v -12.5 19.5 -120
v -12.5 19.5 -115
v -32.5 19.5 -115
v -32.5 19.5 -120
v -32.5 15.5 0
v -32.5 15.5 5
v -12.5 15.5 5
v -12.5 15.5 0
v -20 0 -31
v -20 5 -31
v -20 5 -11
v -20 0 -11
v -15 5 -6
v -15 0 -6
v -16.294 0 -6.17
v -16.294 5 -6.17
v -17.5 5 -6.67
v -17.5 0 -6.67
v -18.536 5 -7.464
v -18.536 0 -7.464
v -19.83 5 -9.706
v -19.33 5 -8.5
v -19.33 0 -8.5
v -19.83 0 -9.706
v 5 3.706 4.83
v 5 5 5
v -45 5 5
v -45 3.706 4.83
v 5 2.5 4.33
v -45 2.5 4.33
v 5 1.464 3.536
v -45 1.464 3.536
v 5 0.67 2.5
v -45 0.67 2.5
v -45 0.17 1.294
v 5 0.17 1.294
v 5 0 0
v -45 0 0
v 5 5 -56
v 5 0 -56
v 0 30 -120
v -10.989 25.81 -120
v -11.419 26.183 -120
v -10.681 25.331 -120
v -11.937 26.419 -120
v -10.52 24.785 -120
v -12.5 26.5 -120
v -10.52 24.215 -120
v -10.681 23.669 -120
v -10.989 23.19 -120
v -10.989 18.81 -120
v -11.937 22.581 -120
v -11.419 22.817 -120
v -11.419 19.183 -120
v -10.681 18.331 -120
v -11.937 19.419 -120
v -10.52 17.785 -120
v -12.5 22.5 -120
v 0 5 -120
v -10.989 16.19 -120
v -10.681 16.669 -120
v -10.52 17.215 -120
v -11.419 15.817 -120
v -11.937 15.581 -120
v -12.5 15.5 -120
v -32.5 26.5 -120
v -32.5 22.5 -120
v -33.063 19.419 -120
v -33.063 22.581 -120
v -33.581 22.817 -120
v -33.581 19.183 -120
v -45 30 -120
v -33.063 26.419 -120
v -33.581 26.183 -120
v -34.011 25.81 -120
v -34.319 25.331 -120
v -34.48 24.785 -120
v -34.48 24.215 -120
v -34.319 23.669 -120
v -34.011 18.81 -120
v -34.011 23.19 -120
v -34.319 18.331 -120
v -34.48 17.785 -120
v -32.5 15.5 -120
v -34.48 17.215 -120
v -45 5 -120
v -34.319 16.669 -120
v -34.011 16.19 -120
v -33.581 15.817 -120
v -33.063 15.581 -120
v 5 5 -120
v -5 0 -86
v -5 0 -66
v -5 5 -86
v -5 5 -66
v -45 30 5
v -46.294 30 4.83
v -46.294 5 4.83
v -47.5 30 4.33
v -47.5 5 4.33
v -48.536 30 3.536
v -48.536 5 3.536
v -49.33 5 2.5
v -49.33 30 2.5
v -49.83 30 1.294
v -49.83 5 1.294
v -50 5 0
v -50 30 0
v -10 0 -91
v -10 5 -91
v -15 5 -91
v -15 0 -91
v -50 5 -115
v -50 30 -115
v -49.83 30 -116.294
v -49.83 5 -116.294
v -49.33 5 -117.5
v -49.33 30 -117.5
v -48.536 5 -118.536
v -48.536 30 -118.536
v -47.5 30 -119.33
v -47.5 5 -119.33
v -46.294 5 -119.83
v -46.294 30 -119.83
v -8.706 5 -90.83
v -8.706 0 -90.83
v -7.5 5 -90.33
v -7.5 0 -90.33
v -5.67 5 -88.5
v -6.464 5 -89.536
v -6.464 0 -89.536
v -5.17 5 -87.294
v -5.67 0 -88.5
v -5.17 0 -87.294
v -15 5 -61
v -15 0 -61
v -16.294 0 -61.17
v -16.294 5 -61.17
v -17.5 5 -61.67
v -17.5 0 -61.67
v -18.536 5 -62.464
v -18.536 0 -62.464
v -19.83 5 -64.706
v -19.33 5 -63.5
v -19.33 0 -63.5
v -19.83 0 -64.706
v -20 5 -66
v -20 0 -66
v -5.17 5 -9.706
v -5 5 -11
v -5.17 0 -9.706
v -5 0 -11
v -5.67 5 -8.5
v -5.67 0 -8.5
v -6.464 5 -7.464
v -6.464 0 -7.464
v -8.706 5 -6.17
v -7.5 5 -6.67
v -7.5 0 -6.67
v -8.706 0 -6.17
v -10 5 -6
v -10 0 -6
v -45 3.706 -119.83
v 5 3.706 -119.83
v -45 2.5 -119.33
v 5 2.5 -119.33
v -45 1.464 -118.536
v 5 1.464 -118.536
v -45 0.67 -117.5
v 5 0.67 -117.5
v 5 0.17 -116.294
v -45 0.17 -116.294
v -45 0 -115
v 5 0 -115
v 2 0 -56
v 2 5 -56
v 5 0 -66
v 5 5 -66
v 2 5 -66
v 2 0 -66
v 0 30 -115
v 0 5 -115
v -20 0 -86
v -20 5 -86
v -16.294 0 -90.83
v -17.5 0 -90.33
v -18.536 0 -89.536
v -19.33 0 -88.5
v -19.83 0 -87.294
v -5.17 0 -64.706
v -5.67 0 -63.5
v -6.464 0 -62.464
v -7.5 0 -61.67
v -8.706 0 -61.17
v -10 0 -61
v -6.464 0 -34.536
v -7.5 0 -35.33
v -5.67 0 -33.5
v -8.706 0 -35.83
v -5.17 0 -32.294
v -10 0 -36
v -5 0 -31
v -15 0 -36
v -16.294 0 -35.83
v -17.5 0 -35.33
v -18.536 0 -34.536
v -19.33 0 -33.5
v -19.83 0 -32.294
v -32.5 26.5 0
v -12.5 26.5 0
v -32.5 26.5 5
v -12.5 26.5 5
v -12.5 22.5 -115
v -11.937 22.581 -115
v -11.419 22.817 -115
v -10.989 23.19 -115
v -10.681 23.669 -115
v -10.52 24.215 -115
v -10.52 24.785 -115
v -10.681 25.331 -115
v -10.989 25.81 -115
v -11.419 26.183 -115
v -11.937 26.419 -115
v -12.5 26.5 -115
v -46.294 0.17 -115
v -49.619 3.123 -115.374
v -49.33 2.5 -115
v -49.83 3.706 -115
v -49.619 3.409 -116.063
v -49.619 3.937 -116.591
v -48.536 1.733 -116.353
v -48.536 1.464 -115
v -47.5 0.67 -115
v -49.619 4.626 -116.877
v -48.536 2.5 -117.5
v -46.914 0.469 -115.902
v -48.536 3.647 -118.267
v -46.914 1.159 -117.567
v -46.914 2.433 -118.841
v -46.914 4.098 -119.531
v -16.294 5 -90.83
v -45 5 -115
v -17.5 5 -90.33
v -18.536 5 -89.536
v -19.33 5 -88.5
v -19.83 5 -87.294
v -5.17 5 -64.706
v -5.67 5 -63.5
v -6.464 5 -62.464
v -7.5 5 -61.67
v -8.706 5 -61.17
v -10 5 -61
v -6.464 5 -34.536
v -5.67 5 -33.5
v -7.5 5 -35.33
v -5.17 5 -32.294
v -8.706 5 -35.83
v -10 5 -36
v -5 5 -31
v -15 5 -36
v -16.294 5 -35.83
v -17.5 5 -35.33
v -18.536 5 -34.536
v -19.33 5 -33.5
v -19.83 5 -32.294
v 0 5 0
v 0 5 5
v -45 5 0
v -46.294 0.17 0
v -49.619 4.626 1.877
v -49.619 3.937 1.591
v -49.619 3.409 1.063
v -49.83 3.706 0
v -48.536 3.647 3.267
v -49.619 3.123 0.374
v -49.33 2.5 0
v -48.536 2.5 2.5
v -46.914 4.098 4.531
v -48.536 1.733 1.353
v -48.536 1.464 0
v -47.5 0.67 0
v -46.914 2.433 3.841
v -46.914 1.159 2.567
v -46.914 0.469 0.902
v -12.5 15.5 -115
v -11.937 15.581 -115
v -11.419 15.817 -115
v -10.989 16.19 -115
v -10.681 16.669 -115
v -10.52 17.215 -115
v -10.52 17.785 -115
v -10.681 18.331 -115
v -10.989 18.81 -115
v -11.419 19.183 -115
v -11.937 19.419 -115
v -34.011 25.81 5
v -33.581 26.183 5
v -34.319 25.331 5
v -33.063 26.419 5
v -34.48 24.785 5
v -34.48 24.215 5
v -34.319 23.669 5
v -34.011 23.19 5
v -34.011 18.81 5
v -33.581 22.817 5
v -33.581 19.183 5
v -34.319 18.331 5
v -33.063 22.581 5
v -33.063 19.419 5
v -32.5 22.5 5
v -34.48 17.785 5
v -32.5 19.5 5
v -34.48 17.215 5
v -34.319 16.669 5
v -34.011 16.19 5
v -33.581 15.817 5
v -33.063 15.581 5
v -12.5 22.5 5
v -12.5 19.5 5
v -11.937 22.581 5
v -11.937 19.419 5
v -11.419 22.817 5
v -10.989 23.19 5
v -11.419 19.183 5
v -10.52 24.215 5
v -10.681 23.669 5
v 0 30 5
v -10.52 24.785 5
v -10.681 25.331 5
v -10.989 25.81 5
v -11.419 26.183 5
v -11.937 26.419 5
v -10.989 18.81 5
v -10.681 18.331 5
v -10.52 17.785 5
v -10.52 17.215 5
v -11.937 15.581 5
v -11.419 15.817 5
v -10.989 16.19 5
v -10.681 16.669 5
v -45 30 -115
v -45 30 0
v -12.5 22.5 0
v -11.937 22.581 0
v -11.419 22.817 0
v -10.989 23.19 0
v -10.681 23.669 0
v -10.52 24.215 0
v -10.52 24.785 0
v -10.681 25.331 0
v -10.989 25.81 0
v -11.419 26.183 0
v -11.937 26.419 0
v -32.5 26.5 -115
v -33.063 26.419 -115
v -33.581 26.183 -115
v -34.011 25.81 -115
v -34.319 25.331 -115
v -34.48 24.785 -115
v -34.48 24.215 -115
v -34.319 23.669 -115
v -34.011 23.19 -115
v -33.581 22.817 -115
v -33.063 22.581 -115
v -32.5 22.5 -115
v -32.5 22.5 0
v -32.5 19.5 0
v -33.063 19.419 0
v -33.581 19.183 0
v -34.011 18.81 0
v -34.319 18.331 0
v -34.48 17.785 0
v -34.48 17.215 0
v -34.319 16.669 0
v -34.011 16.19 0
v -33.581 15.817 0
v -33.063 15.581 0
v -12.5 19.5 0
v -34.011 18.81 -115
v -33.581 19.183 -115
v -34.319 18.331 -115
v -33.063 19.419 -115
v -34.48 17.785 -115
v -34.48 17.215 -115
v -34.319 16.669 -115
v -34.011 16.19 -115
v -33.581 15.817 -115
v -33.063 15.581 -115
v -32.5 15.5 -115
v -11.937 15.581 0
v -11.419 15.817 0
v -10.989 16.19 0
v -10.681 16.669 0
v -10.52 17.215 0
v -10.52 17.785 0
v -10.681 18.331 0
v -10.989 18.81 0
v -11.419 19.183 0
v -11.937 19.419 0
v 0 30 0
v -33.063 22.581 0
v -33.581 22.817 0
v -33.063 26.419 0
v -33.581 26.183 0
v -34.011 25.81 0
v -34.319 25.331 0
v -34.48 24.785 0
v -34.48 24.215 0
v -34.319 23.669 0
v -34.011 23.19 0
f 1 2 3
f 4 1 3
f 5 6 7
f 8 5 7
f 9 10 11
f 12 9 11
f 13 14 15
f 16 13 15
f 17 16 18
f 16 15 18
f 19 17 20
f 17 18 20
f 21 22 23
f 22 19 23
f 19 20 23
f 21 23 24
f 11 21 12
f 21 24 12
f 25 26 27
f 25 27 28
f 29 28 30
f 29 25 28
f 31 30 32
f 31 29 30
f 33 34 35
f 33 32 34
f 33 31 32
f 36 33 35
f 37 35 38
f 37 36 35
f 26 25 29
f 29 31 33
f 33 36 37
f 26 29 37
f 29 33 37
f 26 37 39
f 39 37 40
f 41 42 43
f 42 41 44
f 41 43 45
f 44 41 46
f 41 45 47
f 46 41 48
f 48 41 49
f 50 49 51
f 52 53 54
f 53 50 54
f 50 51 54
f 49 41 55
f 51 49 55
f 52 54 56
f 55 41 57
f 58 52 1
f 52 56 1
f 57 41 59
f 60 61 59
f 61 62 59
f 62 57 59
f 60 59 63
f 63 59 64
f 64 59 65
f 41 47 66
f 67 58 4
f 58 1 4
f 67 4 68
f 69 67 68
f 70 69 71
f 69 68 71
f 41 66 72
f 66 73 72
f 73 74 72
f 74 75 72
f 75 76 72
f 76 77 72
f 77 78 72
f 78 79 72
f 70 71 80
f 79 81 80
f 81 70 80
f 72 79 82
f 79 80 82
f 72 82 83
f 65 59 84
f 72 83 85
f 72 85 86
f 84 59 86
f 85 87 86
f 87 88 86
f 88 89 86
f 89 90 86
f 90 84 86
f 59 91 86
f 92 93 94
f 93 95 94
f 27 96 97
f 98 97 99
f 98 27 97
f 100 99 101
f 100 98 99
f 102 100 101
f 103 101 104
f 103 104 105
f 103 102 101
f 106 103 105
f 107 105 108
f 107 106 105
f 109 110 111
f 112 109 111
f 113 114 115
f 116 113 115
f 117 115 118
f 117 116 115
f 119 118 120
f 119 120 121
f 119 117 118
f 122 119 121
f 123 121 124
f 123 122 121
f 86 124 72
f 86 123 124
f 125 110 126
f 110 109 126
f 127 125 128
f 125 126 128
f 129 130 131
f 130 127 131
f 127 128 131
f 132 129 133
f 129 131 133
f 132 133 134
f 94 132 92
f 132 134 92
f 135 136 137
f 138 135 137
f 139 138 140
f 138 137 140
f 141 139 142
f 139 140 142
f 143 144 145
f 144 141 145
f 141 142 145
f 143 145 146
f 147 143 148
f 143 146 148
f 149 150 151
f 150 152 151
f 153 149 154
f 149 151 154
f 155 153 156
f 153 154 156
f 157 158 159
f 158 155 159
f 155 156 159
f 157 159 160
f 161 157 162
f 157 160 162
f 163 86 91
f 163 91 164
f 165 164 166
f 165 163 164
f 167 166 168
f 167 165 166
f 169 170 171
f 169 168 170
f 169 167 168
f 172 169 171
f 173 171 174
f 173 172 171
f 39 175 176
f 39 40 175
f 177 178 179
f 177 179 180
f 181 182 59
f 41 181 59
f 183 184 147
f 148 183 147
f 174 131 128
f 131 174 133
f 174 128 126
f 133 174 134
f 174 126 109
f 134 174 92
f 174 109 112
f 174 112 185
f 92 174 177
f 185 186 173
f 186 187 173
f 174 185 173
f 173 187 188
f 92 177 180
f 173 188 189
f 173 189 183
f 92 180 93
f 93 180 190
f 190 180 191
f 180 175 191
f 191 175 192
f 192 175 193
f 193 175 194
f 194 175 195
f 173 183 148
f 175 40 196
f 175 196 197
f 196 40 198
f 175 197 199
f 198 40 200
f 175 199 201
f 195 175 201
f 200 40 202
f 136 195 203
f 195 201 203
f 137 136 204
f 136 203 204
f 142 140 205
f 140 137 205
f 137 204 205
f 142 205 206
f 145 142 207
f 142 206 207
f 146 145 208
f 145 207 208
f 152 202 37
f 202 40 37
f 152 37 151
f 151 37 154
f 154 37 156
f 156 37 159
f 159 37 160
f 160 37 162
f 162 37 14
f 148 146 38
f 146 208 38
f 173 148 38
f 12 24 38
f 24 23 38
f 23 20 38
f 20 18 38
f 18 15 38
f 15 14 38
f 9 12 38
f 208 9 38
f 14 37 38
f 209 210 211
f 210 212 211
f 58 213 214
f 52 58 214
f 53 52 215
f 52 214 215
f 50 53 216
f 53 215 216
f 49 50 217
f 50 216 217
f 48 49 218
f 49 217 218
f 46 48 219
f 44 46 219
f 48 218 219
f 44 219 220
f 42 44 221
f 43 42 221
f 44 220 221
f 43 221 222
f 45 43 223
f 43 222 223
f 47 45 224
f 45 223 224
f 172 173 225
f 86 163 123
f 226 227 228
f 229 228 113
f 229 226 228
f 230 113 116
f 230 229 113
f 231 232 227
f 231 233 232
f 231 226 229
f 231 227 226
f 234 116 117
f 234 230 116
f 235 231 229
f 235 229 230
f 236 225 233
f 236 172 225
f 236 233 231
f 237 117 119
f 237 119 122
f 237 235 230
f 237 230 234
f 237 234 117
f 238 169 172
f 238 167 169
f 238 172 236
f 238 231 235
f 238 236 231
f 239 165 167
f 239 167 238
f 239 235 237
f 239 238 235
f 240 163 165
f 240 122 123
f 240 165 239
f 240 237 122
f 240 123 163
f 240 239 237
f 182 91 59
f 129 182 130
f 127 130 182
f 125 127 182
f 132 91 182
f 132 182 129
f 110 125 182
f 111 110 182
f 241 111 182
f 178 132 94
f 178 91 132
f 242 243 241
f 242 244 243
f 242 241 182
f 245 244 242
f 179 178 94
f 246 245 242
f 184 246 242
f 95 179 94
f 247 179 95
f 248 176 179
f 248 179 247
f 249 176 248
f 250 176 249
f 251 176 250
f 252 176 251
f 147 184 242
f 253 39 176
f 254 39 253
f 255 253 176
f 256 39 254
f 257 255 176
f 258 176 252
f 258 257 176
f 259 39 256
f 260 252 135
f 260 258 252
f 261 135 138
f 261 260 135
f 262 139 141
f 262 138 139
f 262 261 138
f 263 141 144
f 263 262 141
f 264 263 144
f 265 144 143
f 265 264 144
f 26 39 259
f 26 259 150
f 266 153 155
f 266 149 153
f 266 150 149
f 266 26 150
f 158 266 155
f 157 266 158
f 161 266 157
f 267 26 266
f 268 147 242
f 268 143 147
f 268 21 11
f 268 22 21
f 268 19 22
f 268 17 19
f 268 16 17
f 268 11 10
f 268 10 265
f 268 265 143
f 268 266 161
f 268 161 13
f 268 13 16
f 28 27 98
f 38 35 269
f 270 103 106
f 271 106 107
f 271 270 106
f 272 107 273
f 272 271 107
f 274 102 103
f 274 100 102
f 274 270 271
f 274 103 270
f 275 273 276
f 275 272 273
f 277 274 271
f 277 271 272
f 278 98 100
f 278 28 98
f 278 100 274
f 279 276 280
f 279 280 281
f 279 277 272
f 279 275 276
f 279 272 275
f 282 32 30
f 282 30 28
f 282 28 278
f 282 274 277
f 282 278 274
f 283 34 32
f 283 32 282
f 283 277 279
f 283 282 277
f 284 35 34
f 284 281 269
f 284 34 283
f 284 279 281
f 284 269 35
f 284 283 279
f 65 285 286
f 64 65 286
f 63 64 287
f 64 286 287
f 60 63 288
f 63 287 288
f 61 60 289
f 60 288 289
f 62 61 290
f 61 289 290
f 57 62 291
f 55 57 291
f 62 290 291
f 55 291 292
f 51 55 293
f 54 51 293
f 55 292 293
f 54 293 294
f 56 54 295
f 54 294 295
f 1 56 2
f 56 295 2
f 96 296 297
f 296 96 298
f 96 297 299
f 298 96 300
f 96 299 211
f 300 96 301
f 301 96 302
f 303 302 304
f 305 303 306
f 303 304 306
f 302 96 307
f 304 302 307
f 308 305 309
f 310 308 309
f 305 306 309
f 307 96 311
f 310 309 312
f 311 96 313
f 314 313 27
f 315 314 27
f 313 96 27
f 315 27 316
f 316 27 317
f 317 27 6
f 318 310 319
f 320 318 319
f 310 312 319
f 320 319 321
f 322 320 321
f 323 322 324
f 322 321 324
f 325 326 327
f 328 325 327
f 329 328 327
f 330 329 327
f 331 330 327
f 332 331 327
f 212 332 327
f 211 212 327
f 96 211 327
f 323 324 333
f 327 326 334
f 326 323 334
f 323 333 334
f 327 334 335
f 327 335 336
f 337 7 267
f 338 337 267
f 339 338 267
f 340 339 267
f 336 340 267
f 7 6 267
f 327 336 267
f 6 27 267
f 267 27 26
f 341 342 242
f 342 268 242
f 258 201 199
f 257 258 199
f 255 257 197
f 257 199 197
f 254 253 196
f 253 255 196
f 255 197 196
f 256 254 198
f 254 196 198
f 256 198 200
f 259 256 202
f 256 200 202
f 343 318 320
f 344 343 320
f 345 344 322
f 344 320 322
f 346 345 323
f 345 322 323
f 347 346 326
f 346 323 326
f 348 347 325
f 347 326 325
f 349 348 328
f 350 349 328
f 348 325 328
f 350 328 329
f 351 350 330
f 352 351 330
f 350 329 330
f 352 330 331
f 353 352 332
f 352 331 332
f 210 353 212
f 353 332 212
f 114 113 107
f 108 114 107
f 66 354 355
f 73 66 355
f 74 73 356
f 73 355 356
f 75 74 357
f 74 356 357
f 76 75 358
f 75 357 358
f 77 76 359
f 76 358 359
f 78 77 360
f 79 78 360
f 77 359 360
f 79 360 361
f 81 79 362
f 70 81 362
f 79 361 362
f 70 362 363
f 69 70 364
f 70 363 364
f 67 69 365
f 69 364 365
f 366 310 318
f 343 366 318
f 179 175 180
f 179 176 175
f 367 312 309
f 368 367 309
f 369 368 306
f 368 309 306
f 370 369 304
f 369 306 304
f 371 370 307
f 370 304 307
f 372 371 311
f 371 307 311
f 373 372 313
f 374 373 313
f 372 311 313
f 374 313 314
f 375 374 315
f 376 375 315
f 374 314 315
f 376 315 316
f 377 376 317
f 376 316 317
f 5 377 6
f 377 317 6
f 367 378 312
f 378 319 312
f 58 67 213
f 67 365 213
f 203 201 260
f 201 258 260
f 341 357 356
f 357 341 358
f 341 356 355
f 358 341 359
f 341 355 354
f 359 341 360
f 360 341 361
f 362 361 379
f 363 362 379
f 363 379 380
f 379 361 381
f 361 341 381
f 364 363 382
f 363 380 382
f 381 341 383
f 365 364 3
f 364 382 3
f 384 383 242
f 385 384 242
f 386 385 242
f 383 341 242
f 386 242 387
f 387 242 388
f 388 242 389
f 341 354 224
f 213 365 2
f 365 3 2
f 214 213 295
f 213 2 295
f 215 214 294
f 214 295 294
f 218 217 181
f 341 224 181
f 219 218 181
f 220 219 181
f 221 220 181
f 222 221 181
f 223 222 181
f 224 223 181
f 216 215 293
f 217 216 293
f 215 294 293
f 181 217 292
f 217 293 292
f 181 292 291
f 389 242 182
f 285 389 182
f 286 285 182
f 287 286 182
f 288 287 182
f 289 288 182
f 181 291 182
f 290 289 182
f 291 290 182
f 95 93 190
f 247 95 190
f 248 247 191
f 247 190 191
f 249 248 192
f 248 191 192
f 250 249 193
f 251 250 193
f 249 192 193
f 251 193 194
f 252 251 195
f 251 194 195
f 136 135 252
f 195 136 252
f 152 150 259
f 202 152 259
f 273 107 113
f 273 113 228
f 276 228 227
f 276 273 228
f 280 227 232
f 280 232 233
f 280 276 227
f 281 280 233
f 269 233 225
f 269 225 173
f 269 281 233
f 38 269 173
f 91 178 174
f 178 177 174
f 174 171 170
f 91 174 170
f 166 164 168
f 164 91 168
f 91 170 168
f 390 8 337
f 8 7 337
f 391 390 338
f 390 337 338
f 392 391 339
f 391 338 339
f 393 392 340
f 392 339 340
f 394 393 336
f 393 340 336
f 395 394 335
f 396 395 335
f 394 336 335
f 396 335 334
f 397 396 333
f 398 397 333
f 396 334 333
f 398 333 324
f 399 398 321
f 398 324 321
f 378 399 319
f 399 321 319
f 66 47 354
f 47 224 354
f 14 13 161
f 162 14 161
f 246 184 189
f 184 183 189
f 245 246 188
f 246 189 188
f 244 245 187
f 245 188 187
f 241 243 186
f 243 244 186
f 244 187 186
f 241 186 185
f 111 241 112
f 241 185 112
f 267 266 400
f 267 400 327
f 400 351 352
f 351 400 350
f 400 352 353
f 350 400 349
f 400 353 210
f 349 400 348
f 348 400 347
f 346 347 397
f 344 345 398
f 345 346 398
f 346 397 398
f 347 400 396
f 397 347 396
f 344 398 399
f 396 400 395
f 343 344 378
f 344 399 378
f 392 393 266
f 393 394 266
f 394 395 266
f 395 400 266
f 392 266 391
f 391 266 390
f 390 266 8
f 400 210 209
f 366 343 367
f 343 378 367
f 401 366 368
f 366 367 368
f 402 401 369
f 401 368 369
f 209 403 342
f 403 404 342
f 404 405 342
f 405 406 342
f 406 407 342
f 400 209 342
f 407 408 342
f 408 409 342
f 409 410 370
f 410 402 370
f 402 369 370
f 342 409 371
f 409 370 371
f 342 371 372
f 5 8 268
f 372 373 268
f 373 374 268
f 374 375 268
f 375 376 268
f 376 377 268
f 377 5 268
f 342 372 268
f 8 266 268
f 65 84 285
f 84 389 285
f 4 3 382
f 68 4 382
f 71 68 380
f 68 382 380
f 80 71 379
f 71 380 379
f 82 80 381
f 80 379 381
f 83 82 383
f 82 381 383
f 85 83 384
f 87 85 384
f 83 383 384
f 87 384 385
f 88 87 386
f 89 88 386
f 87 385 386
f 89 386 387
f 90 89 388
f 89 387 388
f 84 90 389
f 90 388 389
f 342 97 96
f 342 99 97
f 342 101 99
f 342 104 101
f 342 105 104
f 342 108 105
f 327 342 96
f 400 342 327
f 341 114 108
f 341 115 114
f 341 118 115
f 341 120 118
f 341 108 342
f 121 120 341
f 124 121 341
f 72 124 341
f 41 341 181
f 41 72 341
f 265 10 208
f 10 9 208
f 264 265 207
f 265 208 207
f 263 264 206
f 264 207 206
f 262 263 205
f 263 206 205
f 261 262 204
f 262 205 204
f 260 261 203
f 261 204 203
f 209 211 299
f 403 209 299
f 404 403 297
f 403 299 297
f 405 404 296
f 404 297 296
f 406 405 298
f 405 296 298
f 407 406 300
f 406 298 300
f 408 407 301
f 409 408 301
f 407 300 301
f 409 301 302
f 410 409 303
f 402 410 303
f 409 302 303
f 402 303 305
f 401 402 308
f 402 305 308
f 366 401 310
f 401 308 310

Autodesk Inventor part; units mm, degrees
ref_plane "YZ Plane" through (0, 0, 0) normal (1, 0, 0) x (0, 1, 0)
ref_plane "XZ Plane" through (0, 0, 0) normal (0, 1, 0) x (-1, 0, 0)
ref_plane "XY Plane" through (0, 0, 0) normal (0, 0, 1) x (1, 0, 0)
sketch "Sketch1" plane through (0, 0, 0) normal (0, 1, 0) x (-1, 0, 0)
  line L0 (0, 0) -> (45, 0)
  line L1 (45, 0) -> (45, -115)
  line L2 (45, -115) -> (0, -115)
  line L3 (0, -115) -> (0, 0)
  line L4 (50, -120) -> (50, 5)
  line L5 (50, 5) -> (-5, 5)
  line L6 (-5, 5) -> (-5, -120)
  line L7 (-5, -120) -> (50, -120)
  dimension "d0" = 45
  dimension "d1" = 115
  dimension "d2" = 5
extrude "Extrusion1" add sketch "Sketch1" along normal blind 5 contours L0 L1 L2 L3 | L7 L6 L5 L4
sketch "Sketch2" plane through (0, 5, 0) normal (0, 1, 0) x (1, 0, 0)
  line L0 (0, 0) -> (-45, 0)
  line L1 (-45, 0) -> (-45, 115)
  line L2 (-45, 115) -> (0, 115)
  line L3 (0, 115) -> (0, 0)
  line L4 (5, 120) -> (-50, 120)
  line L5 (-50, 120) -> (-50, -5)
  line L6 (-50, -5) -> (5, -5)
  line L7 (0, 115) -> (0, 120)
  line L8 (5, 120) -> (-50, 120) projected
  line L9 (0, 0) -> (0, -5)
  dimension "d5" = 45
  dimension "d6" = 115
  dimension "d7" = 5
extrude "Extrusion2" add sketch "Sketch2" along normal blind 25 contours L9 L6 L5 L4 L7 L2 L1 L0
sketch "Sketch3" plane through (-50, 0, 5) normal (0, 0, 1) x (1, 0, 0)
  line L0 (5, 30) -> (50, 30) projected
  line L1 (27.5, 30) -> (27.5, 24.5)
  line L2 (17.5, 24.5) -> (37.5, 24.5) construction
  line L3 (17.5, 22.5) -> (37.5, 22.5)
  line L4 (37.5, 26.5) -> (17.5, 26.5)
  arc A0 (17.5, 26.5) -> (17.5, 22.5) centre (17.5, 24.5) ccw
  arc A1 (37.5, 22.5) -> (37.5, 26.5) centre (37.5, 24.5) ccw
  line L5 (27.5, 24.5) -> (47.5, 24.5) construction
  point P0 (50, 0)
  dimension "d10" = 5.5
  dimension "d11" = 10
  dimension "d12" = 0
  dimension "d13" = 4
extrude "Extrusion3" cut sketch "Sketch3" against normal blind 125
sketch "Sketch4" plane through (0, 5, 0) normal (0, 1, 0) x (1, 0, 0)
  line L0 (-45, 0) -> (-45, 115) projected
  line L1 (-45, 0) -> (-20, 0)
  line L2 (-45, 0) -> (0, 0) projected
  line L3 (-20, 0) -> (-20, 6)
  line L4 (-20, 6) -> (-5, 6)
  line L5 (-5, 6) -> (-5, 36)
  line L6 (-5, 36) -> (-20, 36)
  line L7 (-20, 36) -> (-20, 6)
  line L8 (-5, 91) -> (-20, 91)
  line L9 (-5, 61) -> (-5, 91)
  line L10 (-20, 91) -> (-20, 61)
  line L11 (-20, 61) -> (-5, 61)
  dimension "d16" = 25
  dimension "d17" = 6
  dimension "d18" = 15
  dimension "d19" = 30
  dimension "d22" = 55
extrude "Extrusion4" cut sketch "Sketch4" against normal blind 5
fillet "Fillet1" radius 5 5 edges at (-22.5, 0, 5) (-22.5, 0, -120) (-50, 0, -57.5) (-50, 15, 5) (-50, 15, -120)
fillet "Fillet2" radius 5 8 edges at (-20, 2.5, -6) (-5, 2.5, -36) (-5, 2.5, -91) (-20, 2.5, -36) (-20, 2.5, -91) (-5, 2.5, -6) (-5, 2.5, -61) (-20, 2.5, -61)
pattern_linear "Rectangular Pattern1" count 2 spacing 7 along (0, -1, 0) of "Extrusion3"
sketch "Sketch5" plane through (5, 0, 0) normal (1, 0, 0) x (0, 0, -1)
  line L0 (61, 0) -> (61, 5) projected
  line L1 (0, 0) -> (61, 0)
  line L2 (61, 0) -> (61, 5)
  line L3 (61, 5) -> (66, 5)
  line L4 (66, 5) -> (66, 0)
  line L5 (66, 0) -> (61, 0)
  line L6 (61, 5) -> (61, 0)
  line L7 (61, 0) -> (56, 0)
  line L8 (56, 0) -> (56, 5)
  line L9 (56, 5) -> (61, 5)
  dimension "d34" = 5
  dimension "d35" = 5
extrude "Extrusion5" cut sketch "Sketch5" against normal blind 3
properties part number "Power_Supply_Shroud"
